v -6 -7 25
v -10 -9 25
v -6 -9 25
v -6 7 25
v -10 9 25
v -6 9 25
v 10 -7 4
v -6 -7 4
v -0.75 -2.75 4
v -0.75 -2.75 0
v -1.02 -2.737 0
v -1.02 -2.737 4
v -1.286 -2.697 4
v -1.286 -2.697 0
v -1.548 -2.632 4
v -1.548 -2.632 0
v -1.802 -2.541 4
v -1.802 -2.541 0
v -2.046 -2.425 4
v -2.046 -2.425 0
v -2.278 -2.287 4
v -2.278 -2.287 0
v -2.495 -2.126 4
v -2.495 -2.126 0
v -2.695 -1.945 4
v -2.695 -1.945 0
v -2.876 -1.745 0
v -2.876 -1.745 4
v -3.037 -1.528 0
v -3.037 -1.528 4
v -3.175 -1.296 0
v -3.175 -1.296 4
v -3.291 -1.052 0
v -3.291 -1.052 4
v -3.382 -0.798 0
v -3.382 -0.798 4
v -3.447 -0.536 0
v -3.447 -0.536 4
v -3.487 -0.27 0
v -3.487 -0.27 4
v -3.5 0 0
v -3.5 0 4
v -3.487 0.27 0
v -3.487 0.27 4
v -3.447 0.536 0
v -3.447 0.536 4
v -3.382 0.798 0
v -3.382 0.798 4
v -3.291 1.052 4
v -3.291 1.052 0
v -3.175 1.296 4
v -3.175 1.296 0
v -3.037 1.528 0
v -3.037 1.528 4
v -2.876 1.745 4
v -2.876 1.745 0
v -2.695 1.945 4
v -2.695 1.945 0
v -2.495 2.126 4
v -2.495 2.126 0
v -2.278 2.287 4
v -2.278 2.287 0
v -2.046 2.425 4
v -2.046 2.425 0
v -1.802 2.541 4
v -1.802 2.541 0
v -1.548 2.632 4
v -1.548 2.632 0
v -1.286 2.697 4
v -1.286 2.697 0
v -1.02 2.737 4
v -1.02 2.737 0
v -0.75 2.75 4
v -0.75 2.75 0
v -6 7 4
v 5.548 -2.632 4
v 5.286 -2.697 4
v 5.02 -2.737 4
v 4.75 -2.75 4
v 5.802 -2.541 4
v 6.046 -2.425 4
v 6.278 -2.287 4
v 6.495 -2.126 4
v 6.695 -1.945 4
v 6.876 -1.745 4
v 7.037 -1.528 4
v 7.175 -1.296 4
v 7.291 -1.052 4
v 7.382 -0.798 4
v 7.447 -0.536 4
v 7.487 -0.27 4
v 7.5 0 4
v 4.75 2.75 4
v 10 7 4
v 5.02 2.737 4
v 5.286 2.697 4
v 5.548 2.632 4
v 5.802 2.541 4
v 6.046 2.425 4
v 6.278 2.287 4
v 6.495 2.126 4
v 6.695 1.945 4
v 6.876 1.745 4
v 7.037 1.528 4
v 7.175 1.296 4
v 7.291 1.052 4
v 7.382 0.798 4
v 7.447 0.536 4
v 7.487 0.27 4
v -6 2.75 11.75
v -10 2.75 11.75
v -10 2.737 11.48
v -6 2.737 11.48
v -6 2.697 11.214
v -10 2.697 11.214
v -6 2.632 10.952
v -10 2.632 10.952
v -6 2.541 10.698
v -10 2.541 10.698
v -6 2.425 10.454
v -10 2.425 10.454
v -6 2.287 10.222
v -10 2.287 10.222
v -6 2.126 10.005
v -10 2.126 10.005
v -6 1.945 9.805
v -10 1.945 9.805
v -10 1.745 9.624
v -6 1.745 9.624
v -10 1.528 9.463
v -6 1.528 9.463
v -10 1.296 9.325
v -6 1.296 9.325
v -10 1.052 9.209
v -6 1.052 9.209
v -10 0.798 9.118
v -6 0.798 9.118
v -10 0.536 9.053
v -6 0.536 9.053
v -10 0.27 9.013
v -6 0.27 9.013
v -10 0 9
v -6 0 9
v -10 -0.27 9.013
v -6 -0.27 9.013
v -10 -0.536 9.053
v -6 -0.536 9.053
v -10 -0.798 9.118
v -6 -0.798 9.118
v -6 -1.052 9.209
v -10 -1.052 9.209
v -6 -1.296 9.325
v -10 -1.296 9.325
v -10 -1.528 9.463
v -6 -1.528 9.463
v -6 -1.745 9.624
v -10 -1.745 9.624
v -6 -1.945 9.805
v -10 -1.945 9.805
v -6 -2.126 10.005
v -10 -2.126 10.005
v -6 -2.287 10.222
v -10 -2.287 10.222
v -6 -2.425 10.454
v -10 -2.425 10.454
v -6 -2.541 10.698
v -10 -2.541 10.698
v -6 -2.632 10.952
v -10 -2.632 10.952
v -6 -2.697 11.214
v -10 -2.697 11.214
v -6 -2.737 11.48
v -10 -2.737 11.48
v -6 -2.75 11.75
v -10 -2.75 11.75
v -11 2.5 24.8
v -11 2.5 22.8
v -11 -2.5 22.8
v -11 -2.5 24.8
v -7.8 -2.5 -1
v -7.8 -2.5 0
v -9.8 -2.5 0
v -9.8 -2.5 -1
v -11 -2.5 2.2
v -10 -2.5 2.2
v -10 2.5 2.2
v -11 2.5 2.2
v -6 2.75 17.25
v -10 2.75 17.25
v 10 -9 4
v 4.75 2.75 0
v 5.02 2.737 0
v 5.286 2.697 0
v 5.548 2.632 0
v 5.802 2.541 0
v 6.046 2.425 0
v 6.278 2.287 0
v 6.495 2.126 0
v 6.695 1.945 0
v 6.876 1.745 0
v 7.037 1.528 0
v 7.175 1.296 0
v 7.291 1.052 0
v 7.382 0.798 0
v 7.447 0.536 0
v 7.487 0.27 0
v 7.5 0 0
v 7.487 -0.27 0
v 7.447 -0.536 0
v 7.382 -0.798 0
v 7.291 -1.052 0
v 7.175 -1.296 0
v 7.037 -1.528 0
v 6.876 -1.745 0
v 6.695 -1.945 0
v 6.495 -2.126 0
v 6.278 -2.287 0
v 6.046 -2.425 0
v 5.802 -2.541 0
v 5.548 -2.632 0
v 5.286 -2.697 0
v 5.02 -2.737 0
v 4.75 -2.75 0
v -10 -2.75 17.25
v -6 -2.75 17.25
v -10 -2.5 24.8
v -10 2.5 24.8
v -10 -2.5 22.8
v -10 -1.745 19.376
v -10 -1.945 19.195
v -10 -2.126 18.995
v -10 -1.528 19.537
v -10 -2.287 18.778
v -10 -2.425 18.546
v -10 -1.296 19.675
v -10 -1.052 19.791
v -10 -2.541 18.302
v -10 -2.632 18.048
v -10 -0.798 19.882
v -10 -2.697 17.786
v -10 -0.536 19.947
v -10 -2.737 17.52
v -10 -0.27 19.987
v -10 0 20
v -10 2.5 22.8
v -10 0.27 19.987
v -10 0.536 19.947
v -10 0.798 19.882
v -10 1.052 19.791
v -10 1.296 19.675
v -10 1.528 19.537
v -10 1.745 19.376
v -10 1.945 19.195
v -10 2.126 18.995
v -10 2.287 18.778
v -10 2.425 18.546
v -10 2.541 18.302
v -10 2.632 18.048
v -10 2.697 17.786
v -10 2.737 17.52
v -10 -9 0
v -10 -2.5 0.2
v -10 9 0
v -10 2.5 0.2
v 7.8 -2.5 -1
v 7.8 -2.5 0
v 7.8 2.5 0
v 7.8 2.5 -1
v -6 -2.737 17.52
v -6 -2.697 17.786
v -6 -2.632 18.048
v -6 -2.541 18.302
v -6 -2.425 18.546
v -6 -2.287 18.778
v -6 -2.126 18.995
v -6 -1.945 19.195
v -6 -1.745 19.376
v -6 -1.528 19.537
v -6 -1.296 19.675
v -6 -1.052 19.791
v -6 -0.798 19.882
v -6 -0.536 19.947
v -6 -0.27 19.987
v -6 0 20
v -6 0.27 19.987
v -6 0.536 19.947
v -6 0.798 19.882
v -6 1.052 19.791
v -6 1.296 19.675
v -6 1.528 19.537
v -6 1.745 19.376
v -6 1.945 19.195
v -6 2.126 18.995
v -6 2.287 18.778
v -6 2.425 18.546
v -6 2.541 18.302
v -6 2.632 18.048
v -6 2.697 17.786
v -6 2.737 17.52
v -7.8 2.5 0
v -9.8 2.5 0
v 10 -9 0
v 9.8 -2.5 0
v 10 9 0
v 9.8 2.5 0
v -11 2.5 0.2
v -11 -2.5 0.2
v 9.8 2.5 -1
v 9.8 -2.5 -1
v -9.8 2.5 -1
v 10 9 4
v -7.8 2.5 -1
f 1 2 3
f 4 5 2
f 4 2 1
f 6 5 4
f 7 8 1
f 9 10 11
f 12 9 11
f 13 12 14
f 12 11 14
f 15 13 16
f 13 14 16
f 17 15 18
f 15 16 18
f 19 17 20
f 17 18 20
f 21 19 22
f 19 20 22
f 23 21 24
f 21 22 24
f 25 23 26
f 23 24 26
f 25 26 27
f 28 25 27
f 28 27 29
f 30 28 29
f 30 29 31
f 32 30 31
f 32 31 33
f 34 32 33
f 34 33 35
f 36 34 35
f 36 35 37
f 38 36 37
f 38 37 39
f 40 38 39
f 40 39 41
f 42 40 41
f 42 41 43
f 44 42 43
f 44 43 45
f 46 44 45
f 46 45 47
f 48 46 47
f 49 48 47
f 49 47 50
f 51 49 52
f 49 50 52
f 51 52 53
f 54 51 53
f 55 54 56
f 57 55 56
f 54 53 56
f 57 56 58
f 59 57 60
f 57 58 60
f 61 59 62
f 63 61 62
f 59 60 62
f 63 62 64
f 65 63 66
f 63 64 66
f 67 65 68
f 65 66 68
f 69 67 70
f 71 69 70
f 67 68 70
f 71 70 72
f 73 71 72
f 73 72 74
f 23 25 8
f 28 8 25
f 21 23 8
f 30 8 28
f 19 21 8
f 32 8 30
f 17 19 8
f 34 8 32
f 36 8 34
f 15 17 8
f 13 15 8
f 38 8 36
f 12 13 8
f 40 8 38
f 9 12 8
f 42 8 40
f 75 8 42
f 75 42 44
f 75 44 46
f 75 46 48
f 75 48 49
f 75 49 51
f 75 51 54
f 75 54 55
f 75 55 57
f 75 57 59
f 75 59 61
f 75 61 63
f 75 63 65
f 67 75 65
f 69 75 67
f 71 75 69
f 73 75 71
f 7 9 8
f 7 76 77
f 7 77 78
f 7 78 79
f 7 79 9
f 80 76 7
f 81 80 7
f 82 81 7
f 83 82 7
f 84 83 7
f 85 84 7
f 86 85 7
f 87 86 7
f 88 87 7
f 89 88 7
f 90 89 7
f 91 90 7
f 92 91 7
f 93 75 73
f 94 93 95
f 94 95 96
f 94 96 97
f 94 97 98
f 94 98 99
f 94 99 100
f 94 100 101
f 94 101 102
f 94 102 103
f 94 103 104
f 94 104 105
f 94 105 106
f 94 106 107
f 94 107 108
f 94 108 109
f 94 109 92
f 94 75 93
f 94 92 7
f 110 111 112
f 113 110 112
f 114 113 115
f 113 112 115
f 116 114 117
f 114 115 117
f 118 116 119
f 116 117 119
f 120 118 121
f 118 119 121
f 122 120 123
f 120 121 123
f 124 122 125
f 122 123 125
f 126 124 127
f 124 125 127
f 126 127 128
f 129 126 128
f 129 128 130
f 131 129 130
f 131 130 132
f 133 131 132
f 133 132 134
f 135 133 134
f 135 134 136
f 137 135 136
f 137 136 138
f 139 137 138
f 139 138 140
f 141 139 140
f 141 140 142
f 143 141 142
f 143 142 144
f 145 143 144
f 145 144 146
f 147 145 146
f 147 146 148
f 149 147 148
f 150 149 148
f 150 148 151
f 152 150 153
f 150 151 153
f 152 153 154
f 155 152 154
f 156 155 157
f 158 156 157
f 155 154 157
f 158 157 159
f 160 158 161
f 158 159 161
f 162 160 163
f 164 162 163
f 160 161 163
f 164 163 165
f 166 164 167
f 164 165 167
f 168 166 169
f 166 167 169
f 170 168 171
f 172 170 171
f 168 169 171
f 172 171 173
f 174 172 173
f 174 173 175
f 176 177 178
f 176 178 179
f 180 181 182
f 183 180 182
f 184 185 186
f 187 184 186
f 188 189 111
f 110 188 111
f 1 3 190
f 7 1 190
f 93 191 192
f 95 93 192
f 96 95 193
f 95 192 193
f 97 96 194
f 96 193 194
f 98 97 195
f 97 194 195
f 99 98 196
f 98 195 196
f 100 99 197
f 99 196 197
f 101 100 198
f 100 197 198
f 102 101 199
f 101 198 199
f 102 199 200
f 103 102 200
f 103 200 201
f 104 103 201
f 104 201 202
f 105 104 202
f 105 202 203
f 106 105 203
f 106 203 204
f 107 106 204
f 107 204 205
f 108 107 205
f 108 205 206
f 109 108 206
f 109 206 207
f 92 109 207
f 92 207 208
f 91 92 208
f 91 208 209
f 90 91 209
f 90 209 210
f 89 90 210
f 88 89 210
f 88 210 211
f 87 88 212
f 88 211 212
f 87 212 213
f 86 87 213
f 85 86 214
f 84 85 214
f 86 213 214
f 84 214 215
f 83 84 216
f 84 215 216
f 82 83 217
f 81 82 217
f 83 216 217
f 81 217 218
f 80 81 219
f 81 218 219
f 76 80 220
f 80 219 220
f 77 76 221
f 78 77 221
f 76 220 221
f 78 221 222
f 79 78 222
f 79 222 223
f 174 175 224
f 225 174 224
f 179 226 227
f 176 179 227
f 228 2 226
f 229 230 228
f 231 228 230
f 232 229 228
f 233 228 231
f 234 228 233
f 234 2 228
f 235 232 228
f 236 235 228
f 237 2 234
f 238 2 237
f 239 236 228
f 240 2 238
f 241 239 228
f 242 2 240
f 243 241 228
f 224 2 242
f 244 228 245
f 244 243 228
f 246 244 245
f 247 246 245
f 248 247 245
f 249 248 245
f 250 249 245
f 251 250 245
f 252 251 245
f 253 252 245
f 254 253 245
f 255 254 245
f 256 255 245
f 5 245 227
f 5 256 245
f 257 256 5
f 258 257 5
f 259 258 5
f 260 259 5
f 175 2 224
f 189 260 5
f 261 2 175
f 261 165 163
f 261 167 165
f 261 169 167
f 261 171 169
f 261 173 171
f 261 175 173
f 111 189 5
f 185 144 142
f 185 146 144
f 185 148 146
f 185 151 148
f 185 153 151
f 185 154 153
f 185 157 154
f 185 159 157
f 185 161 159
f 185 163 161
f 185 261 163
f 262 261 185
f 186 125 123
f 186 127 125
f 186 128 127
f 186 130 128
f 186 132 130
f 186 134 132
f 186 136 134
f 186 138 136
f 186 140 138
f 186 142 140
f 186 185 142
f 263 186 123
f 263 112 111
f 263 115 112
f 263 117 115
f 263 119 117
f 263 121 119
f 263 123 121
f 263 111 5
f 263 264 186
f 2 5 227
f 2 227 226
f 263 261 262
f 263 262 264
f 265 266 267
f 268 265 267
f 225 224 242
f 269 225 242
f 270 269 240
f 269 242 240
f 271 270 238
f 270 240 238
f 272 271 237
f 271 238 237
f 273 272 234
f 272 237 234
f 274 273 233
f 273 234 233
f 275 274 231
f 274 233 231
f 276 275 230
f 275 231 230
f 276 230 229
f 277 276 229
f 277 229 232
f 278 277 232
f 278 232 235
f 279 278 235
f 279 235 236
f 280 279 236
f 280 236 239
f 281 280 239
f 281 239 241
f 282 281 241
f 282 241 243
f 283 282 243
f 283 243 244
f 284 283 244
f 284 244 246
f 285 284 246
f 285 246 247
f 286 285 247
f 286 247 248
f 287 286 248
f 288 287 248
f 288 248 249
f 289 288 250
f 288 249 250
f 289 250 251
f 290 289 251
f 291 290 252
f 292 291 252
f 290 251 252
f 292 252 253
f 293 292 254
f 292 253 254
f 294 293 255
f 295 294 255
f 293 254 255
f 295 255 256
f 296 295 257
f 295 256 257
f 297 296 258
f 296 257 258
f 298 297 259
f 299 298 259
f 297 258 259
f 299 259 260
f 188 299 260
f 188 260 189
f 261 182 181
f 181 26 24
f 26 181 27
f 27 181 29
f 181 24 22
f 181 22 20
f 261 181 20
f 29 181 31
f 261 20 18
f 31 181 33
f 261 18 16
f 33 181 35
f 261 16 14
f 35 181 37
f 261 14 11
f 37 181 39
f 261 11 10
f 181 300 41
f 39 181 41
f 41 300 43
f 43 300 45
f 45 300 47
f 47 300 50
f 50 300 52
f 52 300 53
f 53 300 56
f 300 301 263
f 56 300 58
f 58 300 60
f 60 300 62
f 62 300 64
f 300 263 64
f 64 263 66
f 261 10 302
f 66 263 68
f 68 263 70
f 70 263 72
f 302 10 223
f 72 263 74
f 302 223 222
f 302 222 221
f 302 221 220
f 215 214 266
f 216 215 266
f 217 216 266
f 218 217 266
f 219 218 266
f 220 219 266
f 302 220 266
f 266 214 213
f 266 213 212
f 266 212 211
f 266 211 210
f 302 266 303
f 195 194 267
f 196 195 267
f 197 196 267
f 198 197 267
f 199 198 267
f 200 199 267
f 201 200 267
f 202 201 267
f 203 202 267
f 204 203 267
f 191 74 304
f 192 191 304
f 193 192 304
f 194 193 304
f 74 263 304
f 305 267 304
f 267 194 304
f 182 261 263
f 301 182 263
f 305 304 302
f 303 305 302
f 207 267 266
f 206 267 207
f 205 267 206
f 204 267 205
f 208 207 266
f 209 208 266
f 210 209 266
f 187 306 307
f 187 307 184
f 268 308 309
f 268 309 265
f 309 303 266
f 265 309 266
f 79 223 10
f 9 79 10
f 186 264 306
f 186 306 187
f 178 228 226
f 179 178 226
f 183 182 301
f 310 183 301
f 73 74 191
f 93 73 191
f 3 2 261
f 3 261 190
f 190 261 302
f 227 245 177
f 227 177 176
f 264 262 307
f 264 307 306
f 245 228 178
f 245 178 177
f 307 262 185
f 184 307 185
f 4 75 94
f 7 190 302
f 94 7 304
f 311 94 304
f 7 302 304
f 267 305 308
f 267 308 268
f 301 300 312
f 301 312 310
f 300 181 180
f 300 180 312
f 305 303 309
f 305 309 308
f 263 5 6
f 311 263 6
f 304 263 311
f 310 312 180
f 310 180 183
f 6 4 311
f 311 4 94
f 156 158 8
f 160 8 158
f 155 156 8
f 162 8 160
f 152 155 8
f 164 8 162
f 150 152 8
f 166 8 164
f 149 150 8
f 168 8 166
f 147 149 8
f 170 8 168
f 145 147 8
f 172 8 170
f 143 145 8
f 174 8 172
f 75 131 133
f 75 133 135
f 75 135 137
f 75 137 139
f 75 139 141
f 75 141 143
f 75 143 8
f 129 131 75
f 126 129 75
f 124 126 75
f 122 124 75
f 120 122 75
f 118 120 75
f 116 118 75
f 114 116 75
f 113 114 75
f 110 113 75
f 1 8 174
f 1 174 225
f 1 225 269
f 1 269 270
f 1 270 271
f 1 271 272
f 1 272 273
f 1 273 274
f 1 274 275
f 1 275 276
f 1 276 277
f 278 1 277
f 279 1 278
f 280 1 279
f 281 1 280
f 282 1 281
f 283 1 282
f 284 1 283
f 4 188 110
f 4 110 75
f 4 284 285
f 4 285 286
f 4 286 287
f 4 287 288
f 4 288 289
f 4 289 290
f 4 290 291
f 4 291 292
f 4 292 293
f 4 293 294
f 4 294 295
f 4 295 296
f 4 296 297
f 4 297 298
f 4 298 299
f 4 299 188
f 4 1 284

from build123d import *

# Parameters (mm, degrees)
SKETCH_1_W               = 20
SKETCH_1_H               = 18
EXTRUDE_1_DEPTH          = 25
SKETCH_2_W               = 16
SKETCH_2_H               = 14
CUT_EXTRUDE_1_DEPTH      = 21
CUT_EXTRUDE_2_DEPTH      = 32.320919527
CUT_EXTRUDE_2_DEPTH_BACK = 32.320919527
CUT_EXTRUDE_3_DEPTH      = 25.939927827
CUT_EXTRUDE_3_DEPTH_BACK = 25.939927827
CUT_EXTRUDE_4_DEPTH      = 32.016124839
CUT_EXTRUDE_4_DEPTH_BACK = 32.016124839
SKETCH_7_W               = 2
SKETCH_7_H               = 5
EXTRUDE_2_DEPTH          = 1
SKETCH_8_W               = 2
SKETCH_8_H               = 5
EXTRUDE_3_DEPTH          = 1


with BuildPart() as part:
    # 스케치1 → 보스-돌출1 (new body)
    with BuildSketch(Plane.XY):
        Rectangle(SKETCH_1_W, SKETCH_1_H)
    extrude(amount=EXTRUDE_1_DEPTH)

    # 스케치2 → 컷-돌출1 (cut)
    with BuildSketch(Plane.XY.offset(25)):
        with Locations((2, 0)):
            Rectangle(SKETCH_2_W, SKETCH_2_H)
    extrude(amount=-CUT_EXTRUDE_1_DEPTH, mode=Mode.SUBTRACT)

    # 스케치4 → 컷-돌출2 (cut, two sides: drawn at the far end of the back side and taken through both)
    with BuildSketch(Plane(origin=(0, -7, 0), x_dir=(1, 0, 0), z_dir=(0, 1, 0)).offset(-CUT_EXTRUDE_2_DEPTH_BACK)):
        Polygon((-6, -25), (10, -4), (10, -25), align=None)
    extrude(amount=CUT_EXTRUDE_2_DEPTH + CUT_EXTRUDE_2_DEPTH_BACK, mode=Mode.SUBTRACT)

    # 스케치5 → 컷-돌출3 (cut, two sides: drawn at the far end of the back side and taken through both)
    with BuildSketch(Plane.XY.offset(4).offset(-CUT_EXTRUDE_3_DEPTH_BACK)):
        with BuildLine():
            Line((-0.75, 2.75), (4.75, 2.75))
            ThreePointArc((4.75, 2.75), (7.5, 0), (4.75, -2.75))
            Line((4.75, -2.75), (-0.75, -2.75))
            ThreePointArc((-0.75, -2.75), (-3.5, 0), (-0.75, 2.75))
        make_face()
    extrude(amount=CUT_EXTRUDE_3_DEPTH + CUT_EXTRUDE_3_DEPTH_BACK, mode=Mode.SUBTRACT)

    # 스케치6 → 컷-돌출4 (cut, two sides: drawn at the far end of the back side and taken through both)
    with BuildSketch(Plane(origin=(-6, 0, 0), x_dir=(0, 0, -1), z_dir=(1, 0, 0)).offset(-CUT_EXTRUDE_4_DEPTH_BACK)):
        with BuildLine():
            Line((-17.25, 2.75), (-11.75, 2.75))
            ThreePointArc((-11.75, 2.75), (-9, 0), (-11.75, -2.75))
            Line((-11.75, -2.75), (-17.25, -2.75))
            ThreePointArc((-17.25, -2.75), (-20, 0), (-17.25, 2.75))
        make_face()
    extrude(amount=CUT_EXTRUDE_4_DEPTH + CUT_EXTRUDE_4_DEPTH_BACK, mode=Mode.SUBTRACT)

    # 스케치7 → 보스-돌출2 (add)
    with BuildSketch(Plane(origin=(0, 0, 0), x_dir=(-1, 0, 0), z_dir=(0, 0, -1))):
        with Locations((-8.8, 0)):
            Rectangle(SKETCH_7_W, SKETCH_7_H)
        with Locations((8.8, 0)):
            Rectangle(SKETCH_7_W, SKETCH_7_H)
    extrude(amount=EXTRUDE_2_DEPTH)

    # 스케치8 → 보스-돌출3 (add)
    with BuildSketch(Plane.ZY.offset(10)):
        with Locations((1.2, 0)):
            Rectangle(SKETCH_8_W, SKETCH_8_H)
        with Locations((23.8, 0)):
            Rectangle(SKETCH_8_W, SKETCH_8_H)
    extrude(amount=EXTRUDE_3_DEPTH)


solid = part.part
